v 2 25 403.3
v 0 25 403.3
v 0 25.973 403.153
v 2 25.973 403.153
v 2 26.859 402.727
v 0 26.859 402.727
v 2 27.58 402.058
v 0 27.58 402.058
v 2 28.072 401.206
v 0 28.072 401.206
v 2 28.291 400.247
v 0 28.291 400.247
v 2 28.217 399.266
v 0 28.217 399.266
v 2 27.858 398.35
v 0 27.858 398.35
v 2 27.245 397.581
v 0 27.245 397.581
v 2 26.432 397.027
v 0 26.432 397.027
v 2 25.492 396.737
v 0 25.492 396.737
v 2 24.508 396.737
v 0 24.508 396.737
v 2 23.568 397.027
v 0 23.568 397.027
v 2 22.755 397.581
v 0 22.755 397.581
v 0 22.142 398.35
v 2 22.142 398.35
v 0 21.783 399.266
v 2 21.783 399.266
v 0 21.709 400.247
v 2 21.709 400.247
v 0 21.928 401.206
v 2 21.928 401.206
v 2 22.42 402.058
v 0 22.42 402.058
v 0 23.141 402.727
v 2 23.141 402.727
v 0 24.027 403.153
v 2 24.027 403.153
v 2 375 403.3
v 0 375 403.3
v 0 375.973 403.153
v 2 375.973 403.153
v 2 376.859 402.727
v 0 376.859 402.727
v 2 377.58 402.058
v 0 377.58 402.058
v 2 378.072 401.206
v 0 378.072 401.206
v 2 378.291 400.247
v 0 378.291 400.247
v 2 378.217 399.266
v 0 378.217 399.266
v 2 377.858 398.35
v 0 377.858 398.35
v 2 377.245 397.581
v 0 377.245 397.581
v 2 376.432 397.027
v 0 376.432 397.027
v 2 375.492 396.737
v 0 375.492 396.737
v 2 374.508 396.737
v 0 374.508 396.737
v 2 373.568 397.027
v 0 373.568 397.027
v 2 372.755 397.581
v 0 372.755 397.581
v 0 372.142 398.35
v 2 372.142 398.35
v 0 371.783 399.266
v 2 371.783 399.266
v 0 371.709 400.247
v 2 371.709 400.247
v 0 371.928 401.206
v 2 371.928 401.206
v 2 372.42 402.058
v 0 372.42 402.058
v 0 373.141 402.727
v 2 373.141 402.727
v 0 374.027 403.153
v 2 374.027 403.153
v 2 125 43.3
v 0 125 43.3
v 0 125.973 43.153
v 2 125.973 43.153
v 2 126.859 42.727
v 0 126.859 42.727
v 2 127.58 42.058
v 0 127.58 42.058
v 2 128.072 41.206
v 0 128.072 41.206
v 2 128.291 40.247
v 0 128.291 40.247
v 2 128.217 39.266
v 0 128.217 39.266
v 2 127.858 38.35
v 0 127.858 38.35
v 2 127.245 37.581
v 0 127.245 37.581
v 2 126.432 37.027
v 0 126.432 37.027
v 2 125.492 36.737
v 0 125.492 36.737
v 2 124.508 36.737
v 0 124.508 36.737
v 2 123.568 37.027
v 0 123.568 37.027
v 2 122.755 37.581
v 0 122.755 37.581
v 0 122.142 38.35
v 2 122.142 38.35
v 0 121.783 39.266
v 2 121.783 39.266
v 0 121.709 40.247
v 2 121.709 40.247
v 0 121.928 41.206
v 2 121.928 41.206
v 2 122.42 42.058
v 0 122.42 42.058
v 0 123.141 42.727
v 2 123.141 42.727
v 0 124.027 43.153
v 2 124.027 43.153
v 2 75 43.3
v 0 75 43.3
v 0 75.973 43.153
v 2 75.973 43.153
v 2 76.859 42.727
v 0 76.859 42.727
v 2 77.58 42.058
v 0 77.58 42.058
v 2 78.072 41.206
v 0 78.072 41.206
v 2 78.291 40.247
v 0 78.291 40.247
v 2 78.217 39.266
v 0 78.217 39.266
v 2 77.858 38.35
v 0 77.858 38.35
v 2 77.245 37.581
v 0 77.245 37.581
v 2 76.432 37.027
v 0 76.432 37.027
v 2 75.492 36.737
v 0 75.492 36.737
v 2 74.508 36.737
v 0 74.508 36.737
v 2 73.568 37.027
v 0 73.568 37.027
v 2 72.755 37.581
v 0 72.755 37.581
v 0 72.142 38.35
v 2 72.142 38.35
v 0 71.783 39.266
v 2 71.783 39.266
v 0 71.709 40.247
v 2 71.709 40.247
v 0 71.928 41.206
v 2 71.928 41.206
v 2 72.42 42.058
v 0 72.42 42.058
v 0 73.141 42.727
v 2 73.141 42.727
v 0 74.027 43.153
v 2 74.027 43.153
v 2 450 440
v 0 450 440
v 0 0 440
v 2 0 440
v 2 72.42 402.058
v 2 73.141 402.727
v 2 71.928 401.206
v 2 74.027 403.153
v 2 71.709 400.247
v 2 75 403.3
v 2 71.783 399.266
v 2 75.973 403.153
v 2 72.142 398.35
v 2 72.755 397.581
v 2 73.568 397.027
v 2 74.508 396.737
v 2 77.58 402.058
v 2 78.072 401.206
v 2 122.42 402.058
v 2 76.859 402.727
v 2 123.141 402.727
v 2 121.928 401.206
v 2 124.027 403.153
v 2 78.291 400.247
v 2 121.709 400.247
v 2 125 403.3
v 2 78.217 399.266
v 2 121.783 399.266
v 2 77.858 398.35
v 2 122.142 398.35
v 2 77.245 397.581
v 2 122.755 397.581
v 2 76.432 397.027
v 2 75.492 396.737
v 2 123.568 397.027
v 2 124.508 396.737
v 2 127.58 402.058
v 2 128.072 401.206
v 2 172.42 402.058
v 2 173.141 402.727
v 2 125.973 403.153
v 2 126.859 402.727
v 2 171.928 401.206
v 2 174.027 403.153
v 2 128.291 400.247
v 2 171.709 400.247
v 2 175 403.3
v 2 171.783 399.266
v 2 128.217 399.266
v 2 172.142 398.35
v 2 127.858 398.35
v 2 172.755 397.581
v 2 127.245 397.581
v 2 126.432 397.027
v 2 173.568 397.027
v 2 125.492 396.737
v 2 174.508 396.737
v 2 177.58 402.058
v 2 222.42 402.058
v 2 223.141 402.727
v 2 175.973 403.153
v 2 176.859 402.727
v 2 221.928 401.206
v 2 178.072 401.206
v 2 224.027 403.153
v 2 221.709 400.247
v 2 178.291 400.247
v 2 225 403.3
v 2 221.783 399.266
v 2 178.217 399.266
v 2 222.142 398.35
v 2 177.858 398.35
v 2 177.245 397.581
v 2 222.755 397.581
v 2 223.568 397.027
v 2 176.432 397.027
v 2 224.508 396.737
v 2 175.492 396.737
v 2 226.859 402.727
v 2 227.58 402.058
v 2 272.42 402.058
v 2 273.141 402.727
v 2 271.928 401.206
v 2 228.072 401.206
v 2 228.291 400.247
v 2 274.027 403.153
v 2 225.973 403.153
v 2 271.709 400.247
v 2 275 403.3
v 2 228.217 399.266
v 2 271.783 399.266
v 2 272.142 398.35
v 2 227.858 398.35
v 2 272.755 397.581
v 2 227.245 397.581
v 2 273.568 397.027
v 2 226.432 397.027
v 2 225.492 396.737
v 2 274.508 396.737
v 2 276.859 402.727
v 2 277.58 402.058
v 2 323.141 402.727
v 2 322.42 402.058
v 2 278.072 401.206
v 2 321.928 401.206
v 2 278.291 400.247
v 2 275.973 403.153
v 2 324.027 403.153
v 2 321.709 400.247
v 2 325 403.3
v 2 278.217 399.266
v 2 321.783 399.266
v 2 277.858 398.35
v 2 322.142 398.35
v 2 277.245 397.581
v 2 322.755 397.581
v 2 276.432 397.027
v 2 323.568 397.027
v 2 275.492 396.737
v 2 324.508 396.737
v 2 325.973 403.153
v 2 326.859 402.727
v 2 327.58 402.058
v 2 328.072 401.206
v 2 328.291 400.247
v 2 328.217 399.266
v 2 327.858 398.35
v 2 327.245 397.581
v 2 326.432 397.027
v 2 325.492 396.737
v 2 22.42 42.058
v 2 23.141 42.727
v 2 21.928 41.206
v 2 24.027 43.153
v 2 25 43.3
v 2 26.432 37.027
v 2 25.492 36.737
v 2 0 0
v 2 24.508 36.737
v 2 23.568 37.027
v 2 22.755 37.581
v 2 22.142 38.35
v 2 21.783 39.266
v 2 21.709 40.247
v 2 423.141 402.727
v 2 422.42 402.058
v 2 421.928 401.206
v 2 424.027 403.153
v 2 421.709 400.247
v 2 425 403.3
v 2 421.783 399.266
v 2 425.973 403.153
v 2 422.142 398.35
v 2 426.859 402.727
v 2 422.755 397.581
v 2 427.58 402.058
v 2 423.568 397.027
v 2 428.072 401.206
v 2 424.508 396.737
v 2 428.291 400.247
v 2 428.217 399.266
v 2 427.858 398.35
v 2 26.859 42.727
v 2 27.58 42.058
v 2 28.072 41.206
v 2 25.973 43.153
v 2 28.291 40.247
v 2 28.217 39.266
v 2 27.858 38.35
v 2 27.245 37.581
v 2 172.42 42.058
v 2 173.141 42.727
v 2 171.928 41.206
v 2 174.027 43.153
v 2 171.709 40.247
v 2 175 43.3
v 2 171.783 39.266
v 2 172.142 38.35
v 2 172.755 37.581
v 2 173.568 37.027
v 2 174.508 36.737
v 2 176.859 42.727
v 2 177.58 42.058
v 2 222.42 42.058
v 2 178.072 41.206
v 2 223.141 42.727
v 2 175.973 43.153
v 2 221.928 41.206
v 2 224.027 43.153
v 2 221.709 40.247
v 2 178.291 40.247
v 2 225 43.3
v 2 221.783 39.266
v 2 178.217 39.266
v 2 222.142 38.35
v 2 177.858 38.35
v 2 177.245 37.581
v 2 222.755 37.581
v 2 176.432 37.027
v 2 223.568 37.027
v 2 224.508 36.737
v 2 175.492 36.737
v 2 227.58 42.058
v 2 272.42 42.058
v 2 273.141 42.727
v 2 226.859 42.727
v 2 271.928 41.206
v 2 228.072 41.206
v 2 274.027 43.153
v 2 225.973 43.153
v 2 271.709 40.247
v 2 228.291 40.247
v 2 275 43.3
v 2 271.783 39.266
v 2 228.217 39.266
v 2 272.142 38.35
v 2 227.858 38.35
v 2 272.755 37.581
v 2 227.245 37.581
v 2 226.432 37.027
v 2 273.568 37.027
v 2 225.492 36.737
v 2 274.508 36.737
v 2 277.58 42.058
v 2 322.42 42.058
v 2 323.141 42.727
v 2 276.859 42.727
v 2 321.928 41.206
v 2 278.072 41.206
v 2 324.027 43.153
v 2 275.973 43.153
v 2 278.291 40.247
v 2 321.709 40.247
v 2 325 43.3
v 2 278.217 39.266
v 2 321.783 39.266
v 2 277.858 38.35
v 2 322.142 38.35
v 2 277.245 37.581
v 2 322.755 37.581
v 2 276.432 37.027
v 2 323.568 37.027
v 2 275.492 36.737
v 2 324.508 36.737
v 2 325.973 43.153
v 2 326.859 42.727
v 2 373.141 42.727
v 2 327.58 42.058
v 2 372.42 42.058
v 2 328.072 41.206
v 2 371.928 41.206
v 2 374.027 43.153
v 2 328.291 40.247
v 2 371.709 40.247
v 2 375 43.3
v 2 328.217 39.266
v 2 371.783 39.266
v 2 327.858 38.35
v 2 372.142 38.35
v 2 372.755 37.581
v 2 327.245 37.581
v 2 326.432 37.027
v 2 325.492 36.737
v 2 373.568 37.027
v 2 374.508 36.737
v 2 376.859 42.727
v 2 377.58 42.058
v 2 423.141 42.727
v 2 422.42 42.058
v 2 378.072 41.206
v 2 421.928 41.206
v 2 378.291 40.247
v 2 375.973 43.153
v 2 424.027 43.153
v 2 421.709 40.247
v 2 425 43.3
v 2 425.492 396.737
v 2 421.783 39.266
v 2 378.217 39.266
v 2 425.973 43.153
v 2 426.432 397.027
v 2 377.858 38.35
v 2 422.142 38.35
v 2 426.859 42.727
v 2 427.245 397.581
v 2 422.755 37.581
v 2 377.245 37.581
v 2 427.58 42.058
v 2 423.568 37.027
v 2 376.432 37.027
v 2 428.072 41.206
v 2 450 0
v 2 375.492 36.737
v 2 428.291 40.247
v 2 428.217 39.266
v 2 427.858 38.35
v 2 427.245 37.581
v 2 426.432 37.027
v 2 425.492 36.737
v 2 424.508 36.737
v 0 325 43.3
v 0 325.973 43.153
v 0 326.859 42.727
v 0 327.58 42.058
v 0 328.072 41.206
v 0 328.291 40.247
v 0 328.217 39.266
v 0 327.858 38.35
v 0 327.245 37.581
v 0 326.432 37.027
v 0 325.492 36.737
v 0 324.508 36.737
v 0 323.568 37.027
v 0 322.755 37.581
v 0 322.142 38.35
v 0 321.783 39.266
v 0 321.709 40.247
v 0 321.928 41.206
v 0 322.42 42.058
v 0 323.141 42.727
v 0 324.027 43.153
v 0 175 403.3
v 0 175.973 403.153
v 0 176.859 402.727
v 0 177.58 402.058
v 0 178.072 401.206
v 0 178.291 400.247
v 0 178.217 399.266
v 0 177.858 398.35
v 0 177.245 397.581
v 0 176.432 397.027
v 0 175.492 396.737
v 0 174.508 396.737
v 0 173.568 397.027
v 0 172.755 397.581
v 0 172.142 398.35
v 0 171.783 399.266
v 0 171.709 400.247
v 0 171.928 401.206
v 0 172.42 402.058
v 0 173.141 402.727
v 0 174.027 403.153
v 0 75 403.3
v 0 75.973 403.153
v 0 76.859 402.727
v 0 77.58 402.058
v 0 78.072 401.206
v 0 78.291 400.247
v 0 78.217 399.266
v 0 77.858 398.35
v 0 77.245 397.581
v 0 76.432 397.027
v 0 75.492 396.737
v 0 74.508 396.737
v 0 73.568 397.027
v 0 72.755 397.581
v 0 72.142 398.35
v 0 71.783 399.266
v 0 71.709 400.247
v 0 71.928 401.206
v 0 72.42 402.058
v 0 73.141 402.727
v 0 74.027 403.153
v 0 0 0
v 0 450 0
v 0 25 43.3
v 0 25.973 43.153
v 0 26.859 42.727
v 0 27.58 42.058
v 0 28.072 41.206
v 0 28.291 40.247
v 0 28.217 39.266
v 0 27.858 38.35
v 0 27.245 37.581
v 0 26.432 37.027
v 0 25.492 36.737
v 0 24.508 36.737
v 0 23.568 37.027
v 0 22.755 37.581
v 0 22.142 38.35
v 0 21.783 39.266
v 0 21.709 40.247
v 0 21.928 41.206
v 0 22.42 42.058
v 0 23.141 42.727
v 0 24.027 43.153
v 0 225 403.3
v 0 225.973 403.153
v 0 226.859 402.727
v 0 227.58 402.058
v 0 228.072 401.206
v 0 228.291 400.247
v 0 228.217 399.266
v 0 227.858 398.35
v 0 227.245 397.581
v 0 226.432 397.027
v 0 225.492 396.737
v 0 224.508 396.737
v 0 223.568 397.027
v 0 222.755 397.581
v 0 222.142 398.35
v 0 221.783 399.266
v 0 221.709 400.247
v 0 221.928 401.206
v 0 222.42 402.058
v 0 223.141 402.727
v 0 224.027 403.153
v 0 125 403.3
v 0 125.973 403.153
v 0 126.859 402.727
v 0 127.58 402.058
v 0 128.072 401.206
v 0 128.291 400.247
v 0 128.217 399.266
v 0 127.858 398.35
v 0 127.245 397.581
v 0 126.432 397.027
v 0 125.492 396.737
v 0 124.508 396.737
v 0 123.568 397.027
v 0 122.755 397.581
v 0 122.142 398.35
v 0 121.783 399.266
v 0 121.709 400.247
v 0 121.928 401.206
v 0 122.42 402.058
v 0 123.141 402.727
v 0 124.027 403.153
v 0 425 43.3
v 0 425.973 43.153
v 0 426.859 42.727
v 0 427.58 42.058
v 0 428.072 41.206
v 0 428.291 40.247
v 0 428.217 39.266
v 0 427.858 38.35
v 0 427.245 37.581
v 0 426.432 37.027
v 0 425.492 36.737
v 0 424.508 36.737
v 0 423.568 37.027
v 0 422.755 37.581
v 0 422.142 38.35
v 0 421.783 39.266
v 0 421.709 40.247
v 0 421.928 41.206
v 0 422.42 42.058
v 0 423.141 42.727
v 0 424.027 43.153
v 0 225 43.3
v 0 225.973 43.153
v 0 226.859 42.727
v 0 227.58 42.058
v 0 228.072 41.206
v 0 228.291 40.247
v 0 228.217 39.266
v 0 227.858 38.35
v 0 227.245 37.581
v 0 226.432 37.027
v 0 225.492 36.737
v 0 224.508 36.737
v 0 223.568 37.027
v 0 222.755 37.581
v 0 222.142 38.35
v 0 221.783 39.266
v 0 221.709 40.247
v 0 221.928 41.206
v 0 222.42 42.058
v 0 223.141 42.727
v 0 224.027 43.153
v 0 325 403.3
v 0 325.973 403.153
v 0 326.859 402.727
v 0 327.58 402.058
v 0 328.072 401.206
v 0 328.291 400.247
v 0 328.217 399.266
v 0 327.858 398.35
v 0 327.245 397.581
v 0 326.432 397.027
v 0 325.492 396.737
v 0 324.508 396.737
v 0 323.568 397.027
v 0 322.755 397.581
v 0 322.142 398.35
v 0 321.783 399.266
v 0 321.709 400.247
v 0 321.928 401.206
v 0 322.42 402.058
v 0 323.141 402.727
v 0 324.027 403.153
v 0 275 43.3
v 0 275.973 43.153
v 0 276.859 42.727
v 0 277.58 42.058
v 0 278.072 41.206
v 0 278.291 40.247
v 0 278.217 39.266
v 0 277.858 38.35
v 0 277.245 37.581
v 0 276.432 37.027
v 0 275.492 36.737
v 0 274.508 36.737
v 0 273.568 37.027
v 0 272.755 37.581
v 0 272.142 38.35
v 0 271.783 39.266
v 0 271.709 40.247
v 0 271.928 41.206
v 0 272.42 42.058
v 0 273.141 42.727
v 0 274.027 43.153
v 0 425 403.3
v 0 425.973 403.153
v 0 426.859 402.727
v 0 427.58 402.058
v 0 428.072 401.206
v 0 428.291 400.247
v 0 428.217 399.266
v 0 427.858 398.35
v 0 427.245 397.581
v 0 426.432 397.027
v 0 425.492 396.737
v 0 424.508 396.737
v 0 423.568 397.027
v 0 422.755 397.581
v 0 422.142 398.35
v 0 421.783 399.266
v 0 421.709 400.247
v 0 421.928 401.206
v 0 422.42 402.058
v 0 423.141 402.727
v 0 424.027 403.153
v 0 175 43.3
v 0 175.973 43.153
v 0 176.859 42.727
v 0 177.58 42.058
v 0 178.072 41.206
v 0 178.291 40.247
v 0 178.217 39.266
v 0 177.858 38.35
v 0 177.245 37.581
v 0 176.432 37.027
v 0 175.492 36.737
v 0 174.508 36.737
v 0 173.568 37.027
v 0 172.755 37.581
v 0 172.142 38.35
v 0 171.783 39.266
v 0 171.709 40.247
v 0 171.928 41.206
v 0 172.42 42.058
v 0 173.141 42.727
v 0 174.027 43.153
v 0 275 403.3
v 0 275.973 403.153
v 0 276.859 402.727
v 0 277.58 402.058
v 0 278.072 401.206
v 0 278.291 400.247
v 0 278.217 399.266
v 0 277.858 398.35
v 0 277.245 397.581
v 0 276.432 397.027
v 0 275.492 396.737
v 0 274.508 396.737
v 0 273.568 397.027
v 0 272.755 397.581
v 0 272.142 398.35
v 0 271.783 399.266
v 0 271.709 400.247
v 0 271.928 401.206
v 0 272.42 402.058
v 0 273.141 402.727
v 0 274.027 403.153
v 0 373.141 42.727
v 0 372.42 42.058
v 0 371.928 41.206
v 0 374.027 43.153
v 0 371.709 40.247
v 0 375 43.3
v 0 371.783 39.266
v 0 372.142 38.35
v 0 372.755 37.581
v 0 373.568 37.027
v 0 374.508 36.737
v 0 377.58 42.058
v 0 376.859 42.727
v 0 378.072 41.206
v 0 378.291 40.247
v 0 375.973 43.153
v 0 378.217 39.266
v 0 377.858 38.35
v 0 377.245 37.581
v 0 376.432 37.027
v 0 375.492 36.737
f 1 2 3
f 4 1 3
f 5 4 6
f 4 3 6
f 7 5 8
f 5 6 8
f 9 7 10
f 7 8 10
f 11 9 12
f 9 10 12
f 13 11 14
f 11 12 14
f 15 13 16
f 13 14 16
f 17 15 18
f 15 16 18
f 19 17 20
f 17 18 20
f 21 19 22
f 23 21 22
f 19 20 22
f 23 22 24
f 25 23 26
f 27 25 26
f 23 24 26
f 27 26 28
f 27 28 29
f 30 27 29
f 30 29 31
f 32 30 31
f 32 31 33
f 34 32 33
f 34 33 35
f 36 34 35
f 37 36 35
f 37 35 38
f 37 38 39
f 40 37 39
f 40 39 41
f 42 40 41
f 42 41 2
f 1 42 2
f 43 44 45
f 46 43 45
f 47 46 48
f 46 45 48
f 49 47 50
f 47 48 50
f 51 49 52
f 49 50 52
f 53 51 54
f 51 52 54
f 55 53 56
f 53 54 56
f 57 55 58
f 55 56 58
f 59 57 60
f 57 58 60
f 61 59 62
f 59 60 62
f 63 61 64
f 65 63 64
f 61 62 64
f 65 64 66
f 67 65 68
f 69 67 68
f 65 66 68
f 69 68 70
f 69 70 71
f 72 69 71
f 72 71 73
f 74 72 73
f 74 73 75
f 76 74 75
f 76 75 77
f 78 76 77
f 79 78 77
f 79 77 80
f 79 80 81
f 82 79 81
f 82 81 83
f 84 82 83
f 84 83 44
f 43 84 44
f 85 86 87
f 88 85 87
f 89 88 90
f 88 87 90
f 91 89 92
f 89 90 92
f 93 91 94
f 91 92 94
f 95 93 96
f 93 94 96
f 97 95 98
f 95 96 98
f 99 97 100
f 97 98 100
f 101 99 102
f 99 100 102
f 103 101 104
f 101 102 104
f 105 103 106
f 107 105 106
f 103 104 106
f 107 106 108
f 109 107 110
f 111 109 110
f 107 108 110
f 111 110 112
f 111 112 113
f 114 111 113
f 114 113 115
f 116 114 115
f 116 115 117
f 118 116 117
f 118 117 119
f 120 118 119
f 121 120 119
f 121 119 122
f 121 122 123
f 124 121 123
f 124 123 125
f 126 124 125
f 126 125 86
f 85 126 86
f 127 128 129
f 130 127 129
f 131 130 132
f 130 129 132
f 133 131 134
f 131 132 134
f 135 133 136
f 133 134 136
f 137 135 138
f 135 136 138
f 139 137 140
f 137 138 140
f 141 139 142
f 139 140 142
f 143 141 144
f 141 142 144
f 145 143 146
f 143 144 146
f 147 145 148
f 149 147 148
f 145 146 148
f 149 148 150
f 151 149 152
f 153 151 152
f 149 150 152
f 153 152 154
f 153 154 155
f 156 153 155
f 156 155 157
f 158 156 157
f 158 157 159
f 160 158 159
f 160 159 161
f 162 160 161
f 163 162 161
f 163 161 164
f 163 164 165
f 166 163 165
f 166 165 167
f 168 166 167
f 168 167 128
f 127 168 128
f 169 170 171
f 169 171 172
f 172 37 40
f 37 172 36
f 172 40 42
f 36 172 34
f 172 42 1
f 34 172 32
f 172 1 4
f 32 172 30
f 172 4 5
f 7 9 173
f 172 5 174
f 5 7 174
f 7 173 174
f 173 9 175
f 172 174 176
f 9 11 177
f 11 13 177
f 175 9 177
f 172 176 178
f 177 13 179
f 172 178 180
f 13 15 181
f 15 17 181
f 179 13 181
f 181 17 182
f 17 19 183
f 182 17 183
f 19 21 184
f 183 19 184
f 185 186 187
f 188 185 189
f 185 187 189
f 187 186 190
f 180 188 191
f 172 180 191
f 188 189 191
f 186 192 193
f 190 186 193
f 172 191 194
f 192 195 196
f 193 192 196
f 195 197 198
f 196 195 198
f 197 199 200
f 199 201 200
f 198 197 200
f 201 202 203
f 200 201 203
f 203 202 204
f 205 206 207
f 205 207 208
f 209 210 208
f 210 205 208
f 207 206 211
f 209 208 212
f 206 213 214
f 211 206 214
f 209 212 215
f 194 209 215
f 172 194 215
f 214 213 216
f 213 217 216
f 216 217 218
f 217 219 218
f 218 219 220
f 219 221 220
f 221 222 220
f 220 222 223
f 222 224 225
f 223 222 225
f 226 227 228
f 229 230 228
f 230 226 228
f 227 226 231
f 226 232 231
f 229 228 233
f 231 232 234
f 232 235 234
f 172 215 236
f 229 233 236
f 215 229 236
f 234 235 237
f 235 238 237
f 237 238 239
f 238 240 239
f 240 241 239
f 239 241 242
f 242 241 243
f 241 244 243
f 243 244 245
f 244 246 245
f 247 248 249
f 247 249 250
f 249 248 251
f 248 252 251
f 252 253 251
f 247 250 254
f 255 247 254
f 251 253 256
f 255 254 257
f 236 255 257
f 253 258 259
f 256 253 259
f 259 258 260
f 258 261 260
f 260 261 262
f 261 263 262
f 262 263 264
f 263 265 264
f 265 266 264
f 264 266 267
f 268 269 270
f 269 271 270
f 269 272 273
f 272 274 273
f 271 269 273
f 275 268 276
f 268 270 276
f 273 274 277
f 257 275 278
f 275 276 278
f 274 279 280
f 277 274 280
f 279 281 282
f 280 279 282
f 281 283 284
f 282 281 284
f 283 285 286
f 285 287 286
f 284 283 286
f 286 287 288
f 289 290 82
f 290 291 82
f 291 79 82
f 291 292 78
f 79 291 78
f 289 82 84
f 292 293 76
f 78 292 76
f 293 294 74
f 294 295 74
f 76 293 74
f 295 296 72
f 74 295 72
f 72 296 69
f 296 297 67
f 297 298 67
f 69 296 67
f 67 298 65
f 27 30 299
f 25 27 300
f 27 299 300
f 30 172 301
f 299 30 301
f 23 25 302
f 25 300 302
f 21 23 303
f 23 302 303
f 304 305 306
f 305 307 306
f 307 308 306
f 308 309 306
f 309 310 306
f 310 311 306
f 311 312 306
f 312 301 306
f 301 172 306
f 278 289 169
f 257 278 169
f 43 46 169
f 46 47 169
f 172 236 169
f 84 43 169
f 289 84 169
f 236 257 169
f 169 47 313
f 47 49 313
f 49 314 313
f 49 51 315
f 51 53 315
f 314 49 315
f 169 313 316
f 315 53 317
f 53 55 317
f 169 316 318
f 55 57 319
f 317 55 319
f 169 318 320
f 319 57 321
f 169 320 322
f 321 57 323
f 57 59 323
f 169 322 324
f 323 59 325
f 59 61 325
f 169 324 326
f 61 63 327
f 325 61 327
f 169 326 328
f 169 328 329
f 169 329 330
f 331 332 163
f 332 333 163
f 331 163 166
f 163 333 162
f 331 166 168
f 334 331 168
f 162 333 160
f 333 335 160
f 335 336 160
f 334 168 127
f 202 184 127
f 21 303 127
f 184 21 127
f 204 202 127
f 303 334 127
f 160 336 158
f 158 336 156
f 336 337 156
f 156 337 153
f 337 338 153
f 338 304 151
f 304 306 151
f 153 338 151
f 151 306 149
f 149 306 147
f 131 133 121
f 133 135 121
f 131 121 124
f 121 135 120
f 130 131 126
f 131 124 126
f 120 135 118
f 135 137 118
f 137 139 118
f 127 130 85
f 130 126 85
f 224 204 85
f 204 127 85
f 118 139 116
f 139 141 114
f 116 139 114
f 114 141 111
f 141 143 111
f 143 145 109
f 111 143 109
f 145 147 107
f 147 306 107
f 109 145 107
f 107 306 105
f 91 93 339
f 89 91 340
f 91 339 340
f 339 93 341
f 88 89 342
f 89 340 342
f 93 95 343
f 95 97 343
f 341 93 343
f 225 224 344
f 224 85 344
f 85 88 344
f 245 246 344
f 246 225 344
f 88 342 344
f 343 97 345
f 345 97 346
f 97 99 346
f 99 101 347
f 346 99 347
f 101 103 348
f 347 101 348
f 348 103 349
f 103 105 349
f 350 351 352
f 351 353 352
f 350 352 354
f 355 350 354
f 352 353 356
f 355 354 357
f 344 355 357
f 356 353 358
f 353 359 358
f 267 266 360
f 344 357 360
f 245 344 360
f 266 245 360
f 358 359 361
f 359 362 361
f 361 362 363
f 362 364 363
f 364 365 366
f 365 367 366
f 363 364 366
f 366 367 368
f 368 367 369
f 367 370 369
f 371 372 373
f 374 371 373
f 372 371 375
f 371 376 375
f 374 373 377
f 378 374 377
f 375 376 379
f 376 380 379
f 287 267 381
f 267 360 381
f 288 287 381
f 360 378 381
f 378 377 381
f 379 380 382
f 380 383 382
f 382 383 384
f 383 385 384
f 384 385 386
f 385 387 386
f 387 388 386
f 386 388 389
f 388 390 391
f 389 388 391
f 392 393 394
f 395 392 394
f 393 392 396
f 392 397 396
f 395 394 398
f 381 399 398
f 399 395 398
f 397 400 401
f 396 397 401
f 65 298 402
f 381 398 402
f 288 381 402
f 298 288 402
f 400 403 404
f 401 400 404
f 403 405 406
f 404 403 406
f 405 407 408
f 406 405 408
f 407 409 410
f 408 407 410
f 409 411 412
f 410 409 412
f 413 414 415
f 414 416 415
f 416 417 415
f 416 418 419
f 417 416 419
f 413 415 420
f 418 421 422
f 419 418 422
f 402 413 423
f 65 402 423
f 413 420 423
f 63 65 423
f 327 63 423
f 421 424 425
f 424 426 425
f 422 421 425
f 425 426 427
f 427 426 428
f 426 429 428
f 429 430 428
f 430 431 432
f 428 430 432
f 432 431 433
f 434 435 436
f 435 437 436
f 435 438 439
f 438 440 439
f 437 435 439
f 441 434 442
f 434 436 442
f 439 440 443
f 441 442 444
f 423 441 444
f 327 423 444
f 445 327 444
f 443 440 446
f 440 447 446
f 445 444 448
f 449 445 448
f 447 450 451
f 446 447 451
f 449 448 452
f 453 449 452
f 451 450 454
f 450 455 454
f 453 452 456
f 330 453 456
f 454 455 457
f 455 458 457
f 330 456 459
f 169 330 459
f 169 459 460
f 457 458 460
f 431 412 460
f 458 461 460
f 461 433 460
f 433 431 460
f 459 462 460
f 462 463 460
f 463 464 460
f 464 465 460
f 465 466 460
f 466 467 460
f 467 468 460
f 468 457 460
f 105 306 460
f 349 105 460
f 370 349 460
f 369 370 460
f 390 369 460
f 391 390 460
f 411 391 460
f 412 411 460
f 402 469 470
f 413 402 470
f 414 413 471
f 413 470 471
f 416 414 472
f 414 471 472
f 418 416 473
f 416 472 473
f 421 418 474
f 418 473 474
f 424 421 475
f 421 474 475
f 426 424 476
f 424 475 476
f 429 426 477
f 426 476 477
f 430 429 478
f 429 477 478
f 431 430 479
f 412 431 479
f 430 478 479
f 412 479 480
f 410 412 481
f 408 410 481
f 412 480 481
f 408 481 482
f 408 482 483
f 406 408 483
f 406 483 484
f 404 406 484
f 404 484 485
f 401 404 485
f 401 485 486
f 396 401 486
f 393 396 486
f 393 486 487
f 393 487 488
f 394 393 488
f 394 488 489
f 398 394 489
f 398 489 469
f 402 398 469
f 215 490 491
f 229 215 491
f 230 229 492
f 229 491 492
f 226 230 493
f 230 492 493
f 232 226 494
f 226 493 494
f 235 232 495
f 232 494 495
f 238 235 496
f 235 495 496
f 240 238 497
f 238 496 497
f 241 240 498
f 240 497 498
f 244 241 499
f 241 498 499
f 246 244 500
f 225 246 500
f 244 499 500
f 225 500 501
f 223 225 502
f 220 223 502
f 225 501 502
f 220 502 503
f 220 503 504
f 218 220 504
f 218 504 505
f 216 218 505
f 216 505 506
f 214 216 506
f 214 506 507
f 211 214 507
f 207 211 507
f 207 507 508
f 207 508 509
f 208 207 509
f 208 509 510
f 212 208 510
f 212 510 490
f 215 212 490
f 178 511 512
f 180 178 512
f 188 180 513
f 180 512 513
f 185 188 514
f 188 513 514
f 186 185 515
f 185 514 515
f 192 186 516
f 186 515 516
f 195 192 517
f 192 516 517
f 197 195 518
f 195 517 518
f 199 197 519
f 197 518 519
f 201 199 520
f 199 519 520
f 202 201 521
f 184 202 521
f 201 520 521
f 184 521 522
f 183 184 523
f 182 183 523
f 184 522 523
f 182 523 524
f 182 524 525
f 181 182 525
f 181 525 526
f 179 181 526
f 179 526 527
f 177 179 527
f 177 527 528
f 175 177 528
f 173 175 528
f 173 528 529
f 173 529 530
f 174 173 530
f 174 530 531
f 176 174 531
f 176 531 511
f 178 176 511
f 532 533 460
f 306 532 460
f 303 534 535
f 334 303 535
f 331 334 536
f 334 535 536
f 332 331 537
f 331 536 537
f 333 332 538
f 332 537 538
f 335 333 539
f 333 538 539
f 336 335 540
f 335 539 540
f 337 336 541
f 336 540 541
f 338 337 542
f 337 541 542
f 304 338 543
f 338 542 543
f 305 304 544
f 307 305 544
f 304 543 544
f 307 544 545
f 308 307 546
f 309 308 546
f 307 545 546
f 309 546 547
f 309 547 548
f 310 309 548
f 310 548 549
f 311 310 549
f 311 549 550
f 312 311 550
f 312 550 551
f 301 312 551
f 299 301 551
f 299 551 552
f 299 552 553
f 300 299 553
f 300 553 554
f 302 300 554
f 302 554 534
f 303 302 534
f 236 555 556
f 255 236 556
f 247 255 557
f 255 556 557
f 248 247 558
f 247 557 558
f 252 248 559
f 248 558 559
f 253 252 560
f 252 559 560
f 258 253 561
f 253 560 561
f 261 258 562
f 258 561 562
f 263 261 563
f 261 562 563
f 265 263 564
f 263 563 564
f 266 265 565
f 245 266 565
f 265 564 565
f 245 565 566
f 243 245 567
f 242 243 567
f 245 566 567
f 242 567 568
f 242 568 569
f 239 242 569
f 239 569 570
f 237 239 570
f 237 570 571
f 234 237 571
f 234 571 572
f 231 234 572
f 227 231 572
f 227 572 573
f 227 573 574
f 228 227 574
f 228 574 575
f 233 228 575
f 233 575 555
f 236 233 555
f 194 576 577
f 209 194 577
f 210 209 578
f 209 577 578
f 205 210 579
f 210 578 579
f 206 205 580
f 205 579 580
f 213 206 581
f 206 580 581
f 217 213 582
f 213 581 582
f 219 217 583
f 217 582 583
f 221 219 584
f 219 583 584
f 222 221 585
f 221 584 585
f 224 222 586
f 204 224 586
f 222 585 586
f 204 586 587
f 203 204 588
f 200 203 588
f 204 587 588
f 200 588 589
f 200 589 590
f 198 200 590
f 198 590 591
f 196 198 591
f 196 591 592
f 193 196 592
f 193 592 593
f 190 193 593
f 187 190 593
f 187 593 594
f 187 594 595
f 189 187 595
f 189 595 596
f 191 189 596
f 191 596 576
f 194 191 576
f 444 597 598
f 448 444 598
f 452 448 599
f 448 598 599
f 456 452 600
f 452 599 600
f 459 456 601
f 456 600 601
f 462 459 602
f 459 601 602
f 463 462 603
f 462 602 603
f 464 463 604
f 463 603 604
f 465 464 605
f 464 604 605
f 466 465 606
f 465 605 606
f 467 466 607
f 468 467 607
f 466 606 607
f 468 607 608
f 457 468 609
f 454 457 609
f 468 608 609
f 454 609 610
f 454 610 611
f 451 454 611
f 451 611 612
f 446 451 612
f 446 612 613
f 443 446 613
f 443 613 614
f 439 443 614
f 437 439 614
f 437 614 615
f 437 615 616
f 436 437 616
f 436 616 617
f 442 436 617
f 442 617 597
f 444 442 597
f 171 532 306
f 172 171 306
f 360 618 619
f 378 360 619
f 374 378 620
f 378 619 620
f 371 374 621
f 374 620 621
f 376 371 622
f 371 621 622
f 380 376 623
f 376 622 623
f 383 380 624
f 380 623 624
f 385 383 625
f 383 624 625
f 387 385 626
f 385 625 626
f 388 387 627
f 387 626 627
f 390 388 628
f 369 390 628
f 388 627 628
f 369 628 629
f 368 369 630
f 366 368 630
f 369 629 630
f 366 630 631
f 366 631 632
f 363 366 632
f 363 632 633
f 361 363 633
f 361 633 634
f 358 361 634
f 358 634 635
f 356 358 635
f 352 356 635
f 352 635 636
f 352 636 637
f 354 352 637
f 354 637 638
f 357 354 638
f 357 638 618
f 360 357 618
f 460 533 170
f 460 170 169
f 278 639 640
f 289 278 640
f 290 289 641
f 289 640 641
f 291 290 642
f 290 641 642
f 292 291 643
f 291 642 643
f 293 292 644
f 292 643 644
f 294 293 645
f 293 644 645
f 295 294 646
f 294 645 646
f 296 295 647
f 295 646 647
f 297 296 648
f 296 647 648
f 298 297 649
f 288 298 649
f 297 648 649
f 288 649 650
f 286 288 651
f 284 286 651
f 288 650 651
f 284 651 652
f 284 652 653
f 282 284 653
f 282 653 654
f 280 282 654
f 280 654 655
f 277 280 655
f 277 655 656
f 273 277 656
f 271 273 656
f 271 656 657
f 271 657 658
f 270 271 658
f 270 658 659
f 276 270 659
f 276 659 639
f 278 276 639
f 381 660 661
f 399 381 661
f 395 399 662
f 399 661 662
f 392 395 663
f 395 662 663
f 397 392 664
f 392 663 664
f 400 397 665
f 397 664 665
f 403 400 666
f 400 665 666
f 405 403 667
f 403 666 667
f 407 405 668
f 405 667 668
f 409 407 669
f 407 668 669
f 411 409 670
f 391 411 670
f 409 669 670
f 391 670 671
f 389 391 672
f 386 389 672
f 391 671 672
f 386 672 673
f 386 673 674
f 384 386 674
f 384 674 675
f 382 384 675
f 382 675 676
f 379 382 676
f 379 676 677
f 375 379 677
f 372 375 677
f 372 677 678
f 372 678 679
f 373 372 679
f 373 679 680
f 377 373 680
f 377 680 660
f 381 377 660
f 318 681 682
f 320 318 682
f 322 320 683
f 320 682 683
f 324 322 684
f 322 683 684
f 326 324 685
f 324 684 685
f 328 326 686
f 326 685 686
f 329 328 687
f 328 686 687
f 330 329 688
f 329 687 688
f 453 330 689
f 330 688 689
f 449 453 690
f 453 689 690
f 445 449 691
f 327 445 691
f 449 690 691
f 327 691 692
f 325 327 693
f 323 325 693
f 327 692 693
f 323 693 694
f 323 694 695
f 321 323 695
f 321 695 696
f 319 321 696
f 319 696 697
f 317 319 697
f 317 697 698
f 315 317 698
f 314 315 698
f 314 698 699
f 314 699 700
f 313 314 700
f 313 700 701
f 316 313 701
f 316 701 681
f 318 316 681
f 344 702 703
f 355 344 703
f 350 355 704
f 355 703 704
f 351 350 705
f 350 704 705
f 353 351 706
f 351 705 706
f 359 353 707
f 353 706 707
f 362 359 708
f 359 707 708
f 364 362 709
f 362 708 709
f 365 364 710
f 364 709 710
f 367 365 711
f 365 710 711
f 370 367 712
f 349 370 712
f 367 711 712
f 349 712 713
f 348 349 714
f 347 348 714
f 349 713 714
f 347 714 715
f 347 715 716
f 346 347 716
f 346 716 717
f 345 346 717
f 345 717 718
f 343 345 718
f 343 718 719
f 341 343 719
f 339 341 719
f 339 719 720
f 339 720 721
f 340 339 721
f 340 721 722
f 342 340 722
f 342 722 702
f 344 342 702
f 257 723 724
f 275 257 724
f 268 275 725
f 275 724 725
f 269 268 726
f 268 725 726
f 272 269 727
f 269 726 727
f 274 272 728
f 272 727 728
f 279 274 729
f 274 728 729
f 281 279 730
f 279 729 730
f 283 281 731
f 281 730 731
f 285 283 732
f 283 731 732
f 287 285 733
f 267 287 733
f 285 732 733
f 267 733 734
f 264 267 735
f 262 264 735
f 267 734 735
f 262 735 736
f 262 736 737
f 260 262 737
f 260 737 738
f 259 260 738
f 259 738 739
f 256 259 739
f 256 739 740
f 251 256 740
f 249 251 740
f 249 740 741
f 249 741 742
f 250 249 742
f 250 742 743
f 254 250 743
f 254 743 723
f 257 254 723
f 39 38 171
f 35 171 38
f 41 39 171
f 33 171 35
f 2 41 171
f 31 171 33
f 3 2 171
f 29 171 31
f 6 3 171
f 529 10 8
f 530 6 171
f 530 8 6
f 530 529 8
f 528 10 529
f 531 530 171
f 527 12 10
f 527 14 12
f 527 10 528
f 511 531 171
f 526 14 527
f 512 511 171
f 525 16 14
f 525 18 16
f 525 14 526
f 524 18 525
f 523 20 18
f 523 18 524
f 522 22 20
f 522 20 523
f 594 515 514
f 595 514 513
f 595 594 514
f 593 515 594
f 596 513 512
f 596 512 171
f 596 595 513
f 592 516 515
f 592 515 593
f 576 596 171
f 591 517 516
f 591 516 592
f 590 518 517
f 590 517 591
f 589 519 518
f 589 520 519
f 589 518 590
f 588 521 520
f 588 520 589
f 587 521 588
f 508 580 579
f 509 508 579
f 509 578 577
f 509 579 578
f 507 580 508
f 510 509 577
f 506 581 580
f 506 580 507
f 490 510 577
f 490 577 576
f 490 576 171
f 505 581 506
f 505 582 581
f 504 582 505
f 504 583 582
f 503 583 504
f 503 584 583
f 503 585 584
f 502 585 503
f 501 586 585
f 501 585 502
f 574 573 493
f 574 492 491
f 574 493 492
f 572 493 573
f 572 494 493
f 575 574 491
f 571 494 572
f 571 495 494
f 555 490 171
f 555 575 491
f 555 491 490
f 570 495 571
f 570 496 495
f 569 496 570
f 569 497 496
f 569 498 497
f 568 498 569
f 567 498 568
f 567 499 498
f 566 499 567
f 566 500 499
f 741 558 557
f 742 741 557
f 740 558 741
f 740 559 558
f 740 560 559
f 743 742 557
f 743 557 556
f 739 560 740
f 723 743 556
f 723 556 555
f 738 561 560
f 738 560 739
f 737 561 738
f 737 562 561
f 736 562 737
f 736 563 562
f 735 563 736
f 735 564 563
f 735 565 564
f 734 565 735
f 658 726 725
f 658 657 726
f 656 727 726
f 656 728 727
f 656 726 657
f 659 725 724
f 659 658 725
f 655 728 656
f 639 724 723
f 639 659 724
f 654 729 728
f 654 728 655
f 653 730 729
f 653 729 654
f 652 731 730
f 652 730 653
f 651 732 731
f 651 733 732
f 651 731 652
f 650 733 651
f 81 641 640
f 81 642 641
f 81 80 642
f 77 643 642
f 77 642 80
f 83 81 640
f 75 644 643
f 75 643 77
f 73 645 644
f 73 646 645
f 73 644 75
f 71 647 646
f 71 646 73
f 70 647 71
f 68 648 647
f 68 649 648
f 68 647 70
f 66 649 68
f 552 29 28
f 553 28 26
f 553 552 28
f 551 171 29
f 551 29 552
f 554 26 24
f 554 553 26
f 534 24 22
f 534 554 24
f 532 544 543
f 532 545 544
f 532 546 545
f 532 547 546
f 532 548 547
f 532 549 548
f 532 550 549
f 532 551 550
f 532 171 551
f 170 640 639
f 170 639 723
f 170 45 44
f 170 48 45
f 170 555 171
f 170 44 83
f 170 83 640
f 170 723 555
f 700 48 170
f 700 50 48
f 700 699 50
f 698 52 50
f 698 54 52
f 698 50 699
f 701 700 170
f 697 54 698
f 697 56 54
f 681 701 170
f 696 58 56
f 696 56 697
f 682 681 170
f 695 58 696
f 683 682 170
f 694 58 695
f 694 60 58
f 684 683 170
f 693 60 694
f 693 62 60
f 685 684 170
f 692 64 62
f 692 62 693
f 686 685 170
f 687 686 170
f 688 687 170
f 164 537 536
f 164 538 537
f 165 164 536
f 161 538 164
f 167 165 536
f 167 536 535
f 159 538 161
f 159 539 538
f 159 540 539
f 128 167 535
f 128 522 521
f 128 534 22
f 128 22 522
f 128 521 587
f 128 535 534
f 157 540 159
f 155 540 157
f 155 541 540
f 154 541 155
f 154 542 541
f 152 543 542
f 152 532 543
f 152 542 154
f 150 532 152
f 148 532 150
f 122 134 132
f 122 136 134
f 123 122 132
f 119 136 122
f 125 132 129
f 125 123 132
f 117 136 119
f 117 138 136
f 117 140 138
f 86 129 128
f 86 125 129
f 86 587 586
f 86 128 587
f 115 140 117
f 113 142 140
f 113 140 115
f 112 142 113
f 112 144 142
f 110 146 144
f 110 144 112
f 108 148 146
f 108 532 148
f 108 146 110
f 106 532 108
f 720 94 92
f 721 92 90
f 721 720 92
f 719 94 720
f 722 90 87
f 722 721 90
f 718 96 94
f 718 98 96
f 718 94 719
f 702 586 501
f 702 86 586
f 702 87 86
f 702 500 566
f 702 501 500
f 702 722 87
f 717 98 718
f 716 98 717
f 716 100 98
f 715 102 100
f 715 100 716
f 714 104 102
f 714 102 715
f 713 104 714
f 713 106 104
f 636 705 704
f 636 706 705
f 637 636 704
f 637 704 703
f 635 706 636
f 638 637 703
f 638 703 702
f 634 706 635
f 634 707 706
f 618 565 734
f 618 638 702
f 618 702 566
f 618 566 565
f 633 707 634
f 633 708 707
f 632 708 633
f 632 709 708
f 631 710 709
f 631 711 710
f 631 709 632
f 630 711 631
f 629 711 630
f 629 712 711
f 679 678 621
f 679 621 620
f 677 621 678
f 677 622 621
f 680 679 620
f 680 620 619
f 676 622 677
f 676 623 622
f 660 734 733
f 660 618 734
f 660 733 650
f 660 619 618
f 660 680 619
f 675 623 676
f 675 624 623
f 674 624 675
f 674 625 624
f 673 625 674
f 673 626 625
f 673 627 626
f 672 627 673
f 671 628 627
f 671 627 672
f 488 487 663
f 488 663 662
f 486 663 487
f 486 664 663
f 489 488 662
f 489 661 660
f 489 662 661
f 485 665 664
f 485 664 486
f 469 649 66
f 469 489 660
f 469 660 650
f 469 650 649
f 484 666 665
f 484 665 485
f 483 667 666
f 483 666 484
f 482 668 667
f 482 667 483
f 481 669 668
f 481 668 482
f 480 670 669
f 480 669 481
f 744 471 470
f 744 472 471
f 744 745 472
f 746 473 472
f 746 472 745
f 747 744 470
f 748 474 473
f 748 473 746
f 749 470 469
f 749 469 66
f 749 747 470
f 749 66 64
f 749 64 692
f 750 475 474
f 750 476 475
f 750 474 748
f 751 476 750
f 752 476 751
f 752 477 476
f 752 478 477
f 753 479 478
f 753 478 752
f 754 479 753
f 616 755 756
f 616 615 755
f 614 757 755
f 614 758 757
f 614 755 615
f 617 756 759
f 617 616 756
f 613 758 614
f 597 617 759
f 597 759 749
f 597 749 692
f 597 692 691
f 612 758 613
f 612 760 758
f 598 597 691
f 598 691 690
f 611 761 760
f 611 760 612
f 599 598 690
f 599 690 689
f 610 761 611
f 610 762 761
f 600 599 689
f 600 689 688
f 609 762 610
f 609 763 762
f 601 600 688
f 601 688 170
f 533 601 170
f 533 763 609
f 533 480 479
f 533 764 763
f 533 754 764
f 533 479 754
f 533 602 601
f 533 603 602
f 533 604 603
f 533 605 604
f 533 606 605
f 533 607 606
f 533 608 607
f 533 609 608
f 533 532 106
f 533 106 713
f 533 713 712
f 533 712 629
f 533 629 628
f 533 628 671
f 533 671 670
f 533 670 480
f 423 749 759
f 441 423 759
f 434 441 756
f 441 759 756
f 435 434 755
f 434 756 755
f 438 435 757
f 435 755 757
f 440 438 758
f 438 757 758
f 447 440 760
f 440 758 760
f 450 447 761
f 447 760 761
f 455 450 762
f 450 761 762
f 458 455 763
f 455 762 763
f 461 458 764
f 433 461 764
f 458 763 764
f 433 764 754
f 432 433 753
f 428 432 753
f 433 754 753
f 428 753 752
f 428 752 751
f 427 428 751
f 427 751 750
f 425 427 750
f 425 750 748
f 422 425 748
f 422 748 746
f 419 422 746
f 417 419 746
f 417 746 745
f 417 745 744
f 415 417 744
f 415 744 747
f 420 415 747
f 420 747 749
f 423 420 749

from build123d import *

# Parameters (mm, degrees)
SKETCH_1_W             = 2
SKETCH_1_H             = 450
SM_BASE_FLANGE_1_DEPTH = 440
HOLE_WIZARD_M61_D      = 6.6
HOLE_WIZARD_M61_DEPTH  = 5
HOLE_WIZARD_M61_TIP    = 1.982840043


# Sheet-metal steps are written as plain solids
with BuildPart() as part:
    # Sketch 1 → Базовая кромка1 (new body)
    with BuildSketch(Plane.XY):
        with Locations((1, 225)):
            Rectangle(SKETCH_1_W, SKETCH_1_H)
    extrude(amount=SM_BASE_FLANGE_1_DEPTH)

    # Отверстие с зазором M61
    with Locations(Plane(origin=(2, 0, 0), x_dir=(0, 0, -1), z_dir=(1, 0, 0))):
        with Locations((-400, 425), (-400, 375), (-400, 325), (-400, 275), (-400, 225), (-400, 175), (-400, 125), (-400, 75), (-400, 25), (-40, 25), (-40, 75), (-40, 125), (-40, 175), (-40, 225), (-40, 275), (-40, 325), (-40, 375), (-40, 425)):
            Hole(HOLE_WIZARD_M61_D / 2, depth=HOLE_WIZARD_M61_DEPTH)
            with Locations((0, 0, -(HOLE_WIZARD_M61_DEPTH + HOLE_WIZARD_M61_TIP / 2))):  # 118° drill point
                Cone(0, HOLE_WIZARD_M61_D / 2, HOLE_WIZARD_M61_TIP, mode=Mode.SUBTRACT)


solid = part.part
